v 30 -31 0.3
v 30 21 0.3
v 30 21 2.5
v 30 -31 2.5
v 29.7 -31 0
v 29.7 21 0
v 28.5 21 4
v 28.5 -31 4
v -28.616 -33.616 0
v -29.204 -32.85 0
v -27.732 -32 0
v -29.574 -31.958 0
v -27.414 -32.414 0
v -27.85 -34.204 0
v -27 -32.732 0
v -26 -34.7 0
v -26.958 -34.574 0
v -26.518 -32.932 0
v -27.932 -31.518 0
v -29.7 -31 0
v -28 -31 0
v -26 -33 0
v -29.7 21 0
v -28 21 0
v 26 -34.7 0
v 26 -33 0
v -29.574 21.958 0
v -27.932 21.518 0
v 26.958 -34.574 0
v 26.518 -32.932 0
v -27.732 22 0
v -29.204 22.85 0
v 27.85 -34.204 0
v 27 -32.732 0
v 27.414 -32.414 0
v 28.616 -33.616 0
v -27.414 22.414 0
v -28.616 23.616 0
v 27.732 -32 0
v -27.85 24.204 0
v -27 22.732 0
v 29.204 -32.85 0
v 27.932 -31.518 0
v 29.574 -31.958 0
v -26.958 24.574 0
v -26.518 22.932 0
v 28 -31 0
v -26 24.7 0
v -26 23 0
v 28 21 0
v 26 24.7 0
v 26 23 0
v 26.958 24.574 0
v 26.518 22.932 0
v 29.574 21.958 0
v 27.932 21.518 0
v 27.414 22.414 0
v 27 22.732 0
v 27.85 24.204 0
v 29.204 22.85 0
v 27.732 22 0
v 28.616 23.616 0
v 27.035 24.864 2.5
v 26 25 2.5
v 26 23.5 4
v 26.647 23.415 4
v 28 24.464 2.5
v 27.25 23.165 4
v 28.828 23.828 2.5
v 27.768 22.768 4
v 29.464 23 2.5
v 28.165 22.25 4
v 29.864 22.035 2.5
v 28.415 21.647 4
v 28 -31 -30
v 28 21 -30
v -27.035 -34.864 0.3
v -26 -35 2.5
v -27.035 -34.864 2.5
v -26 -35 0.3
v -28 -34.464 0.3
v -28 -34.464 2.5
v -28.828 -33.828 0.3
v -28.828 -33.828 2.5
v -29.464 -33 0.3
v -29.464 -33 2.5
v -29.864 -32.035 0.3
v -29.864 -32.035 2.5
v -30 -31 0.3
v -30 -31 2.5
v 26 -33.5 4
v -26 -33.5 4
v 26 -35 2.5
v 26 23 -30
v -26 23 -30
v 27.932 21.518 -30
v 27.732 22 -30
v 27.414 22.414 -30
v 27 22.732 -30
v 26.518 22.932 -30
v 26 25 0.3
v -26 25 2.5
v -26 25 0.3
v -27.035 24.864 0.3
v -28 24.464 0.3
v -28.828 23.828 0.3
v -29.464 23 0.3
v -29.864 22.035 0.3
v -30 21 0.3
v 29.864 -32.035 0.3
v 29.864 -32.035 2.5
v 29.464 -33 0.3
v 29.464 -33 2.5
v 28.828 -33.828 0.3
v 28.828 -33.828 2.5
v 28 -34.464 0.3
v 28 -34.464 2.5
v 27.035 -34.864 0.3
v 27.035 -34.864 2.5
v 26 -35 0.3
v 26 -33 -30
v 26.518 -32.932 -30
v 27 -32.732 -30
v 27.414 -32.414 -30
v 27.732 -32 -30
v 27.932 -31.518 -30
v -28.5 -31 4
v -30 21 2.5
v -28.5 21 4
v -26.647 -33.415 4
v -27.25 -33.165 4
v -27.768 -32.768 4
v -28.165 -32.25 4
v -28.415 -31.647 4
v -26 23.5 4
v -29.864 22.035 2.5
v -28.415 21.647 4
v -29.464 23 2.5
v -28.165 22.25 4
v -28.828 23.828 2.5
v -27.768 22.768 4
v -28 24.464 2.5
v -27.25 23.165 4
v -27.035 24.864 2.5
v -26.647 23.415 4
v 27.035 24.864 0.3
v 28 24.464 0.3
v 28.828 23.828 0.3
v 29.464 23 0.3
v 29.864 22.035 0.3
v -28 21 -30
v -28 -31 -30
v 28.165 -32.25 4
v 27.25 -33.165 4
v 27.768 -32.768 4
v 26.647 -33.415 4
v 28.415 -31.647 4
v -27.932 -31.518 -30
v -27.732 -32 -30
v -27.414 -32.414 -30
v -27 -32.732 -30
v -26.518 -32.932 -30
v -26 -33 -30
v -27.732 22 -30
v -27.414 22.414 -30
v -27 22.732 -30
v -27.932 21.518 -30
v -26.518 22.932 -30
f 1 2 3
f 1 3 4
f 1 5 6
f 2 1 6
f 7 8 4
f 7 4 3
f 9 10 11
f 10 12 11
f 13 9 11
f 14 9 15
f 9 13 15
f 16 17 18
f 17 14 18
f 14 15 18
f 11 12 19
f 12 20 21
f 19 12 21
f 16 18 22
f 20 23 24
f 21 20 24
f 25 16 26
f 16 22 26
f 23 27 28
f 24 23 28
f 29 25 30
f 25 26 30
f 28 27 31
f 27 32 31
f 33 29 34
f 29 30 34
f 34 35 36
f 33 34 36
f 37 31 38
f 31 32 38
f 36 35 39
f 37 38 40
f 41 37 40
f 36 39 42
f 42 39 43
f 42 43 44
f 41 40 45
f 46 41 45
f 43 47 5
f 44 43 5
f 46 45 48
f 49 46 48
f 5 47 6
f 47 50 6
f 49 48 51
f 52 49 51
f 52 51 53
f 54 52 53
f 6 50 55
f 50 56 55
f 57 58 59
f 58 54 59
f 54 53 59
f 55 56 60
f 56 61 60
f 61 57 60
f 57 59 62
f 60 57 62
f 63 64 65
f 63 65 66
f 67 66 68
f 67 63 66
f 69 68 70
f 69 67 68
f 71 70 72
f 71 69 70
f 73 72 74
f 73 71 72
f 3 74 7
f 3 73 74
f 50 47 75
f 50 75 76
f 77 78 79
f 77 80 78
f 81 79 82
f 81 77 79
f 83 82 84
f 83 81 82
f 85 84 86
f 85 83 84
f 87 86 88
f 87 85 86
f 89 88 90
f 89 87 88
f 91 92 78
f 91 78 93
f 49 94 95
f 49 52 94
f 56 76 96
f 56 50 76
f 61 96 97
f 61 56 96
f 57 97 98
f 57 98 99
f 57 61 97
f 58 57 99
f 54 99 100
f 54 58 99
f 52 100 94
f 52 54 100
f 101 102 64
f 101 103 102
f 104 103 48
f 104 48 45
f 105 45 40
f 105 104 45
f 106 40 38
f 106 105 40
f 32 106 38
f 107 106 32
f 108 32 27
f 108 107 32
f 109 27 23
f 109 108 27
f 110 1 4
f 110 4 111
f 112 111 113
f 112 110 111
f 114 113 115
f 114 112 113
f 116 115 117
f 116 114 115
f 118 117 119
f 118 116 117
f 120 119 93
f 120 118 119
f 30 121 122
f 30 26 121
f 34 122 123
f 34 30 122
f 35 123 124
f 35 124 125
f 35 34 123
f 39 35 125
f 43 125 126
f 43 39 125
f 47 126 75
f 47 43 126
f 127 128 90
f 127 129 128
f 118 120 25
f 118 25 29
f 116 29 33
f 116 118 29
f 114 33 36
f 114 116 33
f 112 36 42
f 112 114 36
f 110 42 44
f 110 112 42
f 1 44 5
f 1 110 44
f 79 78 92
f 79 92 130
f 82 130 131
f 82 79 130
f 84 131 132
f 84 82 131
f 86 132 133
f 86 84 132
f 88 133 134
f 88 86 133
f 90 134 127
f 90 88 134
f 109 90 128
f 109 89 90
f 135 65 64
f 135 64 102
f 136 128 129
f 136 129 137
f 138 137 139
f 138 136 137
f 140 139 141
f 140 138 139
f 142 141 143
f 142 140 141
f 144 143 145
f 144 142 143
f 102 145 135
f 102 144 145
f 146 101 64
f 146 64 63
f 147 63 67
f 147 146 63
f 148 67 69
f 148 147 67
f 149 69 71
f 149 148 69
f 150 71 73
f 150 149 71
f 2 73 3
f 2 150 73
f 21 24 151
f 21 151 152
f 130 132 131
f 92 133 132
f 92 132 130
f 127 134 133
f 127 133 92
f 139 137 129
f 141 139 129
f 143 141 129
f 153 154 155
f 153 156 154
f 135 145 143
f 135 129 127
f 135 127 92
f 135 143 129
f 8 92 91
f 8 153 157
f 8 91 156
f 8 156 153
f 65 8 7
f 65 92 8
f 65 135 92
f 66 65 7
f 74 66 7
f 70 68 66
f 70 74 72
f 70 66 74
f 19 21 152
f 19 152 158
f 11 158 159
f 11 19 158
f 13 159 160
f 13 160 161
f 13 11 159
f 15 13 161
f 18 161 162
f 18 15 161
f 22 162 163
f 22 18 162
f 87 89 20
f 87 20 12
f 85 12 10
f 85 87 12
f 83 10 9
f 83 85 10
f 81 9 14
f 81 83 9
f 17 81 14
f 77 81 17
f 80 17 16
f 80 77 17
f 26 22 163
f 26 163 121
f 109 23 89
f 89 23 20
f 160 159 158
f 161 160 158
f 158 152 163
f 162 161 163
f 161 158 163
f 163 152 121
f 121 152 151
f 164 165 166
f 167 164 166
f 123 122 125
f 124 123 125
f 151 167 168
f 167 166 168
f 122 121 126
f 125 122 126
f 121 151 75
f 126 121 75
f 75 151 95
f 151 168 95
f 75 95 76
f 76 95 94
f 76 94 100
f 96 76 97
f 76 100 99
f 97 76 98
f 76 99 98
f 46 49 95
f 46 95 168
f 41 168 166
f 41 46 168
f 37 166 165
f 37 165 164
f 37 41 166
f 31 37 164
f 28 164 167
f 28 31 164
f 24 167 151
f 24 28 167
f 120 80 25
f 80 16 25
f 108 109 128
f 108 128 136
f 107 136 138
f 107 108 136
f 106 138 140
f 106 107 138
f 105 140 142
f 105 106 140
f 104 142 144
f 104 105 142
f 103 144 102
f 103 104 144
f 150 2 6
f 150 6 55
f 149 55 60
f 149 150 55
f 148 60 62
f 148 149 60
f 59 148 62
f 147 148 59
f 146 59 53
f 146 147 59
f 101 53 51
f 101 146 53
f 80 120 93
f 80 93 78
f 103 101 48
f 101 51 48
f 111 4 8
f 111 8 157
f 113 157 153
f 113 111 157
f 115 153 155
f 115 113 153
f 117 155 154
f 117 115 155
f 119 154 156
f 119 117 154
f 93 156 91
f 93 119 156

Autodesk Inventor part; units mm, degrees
ref_plane "YZ Plane" through (0, 0, 0) normal (1, 0, 0) x (0, 1, 0)
ref_plane "XZ Plane" through (0, 0, 0) normal (0, 1, 0) x (-1, 0, 0)
ref_plane "XY Plane" through (0, 0, 0) normal (0, 0, 1) x (1, 0, 0)
sketch "Sketch1" plane through (0, 0, 0) normal (0, 0, 1) x (1, 0, 0)
  line L0 (26, 23) -> (-26, 23) projected
  arc A0 (-26, 23) -> (-28, 21) centre (-26, 21) ccw projected
  line L1 (-28, 21) -> (-28, -31) projected
  arc A1 (28, 21) -> (26, 23) centre (26, 21) ccw projected
  line L2 (28, -31) -> (28, 21) projected
  arc A2 (26, -33) -> (28, -31) centre (26, -31) ccw projected
  line L3 (-26, -33) -> (26, -33) projected
  arc A3 (-28, -31) -> (-26, -33) centre (-26, -31) ccw projected
  point P0 (0, 0)
extrude "Extrusion1" add sketch "Sketch1" against normal blind 30
sketch "Sketch2" plane through (0, 0, 0) normal (0, 0, 1) x (1, 0, 0)
  line L0 (26, 23) -> (-26, 23) projected
  arc A0 (28, 21) -> (26, 23) centre (26, 21) ccw projected
  line L1 (28, -31) -> (28, 21) projected
  arc A1 (26, -33) -> (28, -31) centre (26, -31) ccw projected
  line L2 (-26, -33) -> (26, -33) projected
  arc A2 (-28, -31) -> (-26, -33) centre (-26, -31) ccw projected
  line L3 (-28, 21) -> (-28, -31) projected
  arc A3 (-26, 23) -> (-28, 21) centre (-26, 21) ccw projected
  line L4 (-30, -31) -> (-30, 21) projected
  arc A4 (-30, -31) -> (-26, -35) centre (-26, -31) ccw projected
  line L5 (26, -35) -> (-26, -35) projected
  arc A5 (26, -35) -> (30, -31) centre (26, -31) ccw projected
  line L6 (30, 21) -> (30, -31) projected
  arc A6 (30, 21) -> (26, 25) centre (26, 21) ccw projected
  line L7 (-26, 25) -> (26, 25) projected
  arc A7 (-26, 25) -> (-30, 21) centre (-26, 21) ccw projected
  point P0 (0, 0)
extrude "Extrusion2" add sketch "Sketch2" along normal blind 4 contours A0 L1 A1 L2 A2 L3 A3 L0 | L4 A7 L7 A6 L6 A5 L5 A4
chamfer "Chamfer1" distance 1.5 angle 45 8 edges at (-30, -5, 4) (-28.8284, -33.8284, 4) (0, -35, 4) (28.8284, -33.8284, 4) (30, -5, 4) (28.8284, 23.8284, 4) (0, 25, 4) (-28.8284, 23.8284, 4)
chamfer "Chamfer2" distance 0.3 angle 45 8 edges at (-30, -5, 0) (-28.8284, 23.8284, 0) (0, 25, 0) (28.8284, 23.8284, 0) (30, -5, 0) (28.8284, -33.8284, 0) (0, -35, 0) (-28.8284, -33.8284, 0)
properties part number "nút nhựa bịt hộp thép 60x60"
